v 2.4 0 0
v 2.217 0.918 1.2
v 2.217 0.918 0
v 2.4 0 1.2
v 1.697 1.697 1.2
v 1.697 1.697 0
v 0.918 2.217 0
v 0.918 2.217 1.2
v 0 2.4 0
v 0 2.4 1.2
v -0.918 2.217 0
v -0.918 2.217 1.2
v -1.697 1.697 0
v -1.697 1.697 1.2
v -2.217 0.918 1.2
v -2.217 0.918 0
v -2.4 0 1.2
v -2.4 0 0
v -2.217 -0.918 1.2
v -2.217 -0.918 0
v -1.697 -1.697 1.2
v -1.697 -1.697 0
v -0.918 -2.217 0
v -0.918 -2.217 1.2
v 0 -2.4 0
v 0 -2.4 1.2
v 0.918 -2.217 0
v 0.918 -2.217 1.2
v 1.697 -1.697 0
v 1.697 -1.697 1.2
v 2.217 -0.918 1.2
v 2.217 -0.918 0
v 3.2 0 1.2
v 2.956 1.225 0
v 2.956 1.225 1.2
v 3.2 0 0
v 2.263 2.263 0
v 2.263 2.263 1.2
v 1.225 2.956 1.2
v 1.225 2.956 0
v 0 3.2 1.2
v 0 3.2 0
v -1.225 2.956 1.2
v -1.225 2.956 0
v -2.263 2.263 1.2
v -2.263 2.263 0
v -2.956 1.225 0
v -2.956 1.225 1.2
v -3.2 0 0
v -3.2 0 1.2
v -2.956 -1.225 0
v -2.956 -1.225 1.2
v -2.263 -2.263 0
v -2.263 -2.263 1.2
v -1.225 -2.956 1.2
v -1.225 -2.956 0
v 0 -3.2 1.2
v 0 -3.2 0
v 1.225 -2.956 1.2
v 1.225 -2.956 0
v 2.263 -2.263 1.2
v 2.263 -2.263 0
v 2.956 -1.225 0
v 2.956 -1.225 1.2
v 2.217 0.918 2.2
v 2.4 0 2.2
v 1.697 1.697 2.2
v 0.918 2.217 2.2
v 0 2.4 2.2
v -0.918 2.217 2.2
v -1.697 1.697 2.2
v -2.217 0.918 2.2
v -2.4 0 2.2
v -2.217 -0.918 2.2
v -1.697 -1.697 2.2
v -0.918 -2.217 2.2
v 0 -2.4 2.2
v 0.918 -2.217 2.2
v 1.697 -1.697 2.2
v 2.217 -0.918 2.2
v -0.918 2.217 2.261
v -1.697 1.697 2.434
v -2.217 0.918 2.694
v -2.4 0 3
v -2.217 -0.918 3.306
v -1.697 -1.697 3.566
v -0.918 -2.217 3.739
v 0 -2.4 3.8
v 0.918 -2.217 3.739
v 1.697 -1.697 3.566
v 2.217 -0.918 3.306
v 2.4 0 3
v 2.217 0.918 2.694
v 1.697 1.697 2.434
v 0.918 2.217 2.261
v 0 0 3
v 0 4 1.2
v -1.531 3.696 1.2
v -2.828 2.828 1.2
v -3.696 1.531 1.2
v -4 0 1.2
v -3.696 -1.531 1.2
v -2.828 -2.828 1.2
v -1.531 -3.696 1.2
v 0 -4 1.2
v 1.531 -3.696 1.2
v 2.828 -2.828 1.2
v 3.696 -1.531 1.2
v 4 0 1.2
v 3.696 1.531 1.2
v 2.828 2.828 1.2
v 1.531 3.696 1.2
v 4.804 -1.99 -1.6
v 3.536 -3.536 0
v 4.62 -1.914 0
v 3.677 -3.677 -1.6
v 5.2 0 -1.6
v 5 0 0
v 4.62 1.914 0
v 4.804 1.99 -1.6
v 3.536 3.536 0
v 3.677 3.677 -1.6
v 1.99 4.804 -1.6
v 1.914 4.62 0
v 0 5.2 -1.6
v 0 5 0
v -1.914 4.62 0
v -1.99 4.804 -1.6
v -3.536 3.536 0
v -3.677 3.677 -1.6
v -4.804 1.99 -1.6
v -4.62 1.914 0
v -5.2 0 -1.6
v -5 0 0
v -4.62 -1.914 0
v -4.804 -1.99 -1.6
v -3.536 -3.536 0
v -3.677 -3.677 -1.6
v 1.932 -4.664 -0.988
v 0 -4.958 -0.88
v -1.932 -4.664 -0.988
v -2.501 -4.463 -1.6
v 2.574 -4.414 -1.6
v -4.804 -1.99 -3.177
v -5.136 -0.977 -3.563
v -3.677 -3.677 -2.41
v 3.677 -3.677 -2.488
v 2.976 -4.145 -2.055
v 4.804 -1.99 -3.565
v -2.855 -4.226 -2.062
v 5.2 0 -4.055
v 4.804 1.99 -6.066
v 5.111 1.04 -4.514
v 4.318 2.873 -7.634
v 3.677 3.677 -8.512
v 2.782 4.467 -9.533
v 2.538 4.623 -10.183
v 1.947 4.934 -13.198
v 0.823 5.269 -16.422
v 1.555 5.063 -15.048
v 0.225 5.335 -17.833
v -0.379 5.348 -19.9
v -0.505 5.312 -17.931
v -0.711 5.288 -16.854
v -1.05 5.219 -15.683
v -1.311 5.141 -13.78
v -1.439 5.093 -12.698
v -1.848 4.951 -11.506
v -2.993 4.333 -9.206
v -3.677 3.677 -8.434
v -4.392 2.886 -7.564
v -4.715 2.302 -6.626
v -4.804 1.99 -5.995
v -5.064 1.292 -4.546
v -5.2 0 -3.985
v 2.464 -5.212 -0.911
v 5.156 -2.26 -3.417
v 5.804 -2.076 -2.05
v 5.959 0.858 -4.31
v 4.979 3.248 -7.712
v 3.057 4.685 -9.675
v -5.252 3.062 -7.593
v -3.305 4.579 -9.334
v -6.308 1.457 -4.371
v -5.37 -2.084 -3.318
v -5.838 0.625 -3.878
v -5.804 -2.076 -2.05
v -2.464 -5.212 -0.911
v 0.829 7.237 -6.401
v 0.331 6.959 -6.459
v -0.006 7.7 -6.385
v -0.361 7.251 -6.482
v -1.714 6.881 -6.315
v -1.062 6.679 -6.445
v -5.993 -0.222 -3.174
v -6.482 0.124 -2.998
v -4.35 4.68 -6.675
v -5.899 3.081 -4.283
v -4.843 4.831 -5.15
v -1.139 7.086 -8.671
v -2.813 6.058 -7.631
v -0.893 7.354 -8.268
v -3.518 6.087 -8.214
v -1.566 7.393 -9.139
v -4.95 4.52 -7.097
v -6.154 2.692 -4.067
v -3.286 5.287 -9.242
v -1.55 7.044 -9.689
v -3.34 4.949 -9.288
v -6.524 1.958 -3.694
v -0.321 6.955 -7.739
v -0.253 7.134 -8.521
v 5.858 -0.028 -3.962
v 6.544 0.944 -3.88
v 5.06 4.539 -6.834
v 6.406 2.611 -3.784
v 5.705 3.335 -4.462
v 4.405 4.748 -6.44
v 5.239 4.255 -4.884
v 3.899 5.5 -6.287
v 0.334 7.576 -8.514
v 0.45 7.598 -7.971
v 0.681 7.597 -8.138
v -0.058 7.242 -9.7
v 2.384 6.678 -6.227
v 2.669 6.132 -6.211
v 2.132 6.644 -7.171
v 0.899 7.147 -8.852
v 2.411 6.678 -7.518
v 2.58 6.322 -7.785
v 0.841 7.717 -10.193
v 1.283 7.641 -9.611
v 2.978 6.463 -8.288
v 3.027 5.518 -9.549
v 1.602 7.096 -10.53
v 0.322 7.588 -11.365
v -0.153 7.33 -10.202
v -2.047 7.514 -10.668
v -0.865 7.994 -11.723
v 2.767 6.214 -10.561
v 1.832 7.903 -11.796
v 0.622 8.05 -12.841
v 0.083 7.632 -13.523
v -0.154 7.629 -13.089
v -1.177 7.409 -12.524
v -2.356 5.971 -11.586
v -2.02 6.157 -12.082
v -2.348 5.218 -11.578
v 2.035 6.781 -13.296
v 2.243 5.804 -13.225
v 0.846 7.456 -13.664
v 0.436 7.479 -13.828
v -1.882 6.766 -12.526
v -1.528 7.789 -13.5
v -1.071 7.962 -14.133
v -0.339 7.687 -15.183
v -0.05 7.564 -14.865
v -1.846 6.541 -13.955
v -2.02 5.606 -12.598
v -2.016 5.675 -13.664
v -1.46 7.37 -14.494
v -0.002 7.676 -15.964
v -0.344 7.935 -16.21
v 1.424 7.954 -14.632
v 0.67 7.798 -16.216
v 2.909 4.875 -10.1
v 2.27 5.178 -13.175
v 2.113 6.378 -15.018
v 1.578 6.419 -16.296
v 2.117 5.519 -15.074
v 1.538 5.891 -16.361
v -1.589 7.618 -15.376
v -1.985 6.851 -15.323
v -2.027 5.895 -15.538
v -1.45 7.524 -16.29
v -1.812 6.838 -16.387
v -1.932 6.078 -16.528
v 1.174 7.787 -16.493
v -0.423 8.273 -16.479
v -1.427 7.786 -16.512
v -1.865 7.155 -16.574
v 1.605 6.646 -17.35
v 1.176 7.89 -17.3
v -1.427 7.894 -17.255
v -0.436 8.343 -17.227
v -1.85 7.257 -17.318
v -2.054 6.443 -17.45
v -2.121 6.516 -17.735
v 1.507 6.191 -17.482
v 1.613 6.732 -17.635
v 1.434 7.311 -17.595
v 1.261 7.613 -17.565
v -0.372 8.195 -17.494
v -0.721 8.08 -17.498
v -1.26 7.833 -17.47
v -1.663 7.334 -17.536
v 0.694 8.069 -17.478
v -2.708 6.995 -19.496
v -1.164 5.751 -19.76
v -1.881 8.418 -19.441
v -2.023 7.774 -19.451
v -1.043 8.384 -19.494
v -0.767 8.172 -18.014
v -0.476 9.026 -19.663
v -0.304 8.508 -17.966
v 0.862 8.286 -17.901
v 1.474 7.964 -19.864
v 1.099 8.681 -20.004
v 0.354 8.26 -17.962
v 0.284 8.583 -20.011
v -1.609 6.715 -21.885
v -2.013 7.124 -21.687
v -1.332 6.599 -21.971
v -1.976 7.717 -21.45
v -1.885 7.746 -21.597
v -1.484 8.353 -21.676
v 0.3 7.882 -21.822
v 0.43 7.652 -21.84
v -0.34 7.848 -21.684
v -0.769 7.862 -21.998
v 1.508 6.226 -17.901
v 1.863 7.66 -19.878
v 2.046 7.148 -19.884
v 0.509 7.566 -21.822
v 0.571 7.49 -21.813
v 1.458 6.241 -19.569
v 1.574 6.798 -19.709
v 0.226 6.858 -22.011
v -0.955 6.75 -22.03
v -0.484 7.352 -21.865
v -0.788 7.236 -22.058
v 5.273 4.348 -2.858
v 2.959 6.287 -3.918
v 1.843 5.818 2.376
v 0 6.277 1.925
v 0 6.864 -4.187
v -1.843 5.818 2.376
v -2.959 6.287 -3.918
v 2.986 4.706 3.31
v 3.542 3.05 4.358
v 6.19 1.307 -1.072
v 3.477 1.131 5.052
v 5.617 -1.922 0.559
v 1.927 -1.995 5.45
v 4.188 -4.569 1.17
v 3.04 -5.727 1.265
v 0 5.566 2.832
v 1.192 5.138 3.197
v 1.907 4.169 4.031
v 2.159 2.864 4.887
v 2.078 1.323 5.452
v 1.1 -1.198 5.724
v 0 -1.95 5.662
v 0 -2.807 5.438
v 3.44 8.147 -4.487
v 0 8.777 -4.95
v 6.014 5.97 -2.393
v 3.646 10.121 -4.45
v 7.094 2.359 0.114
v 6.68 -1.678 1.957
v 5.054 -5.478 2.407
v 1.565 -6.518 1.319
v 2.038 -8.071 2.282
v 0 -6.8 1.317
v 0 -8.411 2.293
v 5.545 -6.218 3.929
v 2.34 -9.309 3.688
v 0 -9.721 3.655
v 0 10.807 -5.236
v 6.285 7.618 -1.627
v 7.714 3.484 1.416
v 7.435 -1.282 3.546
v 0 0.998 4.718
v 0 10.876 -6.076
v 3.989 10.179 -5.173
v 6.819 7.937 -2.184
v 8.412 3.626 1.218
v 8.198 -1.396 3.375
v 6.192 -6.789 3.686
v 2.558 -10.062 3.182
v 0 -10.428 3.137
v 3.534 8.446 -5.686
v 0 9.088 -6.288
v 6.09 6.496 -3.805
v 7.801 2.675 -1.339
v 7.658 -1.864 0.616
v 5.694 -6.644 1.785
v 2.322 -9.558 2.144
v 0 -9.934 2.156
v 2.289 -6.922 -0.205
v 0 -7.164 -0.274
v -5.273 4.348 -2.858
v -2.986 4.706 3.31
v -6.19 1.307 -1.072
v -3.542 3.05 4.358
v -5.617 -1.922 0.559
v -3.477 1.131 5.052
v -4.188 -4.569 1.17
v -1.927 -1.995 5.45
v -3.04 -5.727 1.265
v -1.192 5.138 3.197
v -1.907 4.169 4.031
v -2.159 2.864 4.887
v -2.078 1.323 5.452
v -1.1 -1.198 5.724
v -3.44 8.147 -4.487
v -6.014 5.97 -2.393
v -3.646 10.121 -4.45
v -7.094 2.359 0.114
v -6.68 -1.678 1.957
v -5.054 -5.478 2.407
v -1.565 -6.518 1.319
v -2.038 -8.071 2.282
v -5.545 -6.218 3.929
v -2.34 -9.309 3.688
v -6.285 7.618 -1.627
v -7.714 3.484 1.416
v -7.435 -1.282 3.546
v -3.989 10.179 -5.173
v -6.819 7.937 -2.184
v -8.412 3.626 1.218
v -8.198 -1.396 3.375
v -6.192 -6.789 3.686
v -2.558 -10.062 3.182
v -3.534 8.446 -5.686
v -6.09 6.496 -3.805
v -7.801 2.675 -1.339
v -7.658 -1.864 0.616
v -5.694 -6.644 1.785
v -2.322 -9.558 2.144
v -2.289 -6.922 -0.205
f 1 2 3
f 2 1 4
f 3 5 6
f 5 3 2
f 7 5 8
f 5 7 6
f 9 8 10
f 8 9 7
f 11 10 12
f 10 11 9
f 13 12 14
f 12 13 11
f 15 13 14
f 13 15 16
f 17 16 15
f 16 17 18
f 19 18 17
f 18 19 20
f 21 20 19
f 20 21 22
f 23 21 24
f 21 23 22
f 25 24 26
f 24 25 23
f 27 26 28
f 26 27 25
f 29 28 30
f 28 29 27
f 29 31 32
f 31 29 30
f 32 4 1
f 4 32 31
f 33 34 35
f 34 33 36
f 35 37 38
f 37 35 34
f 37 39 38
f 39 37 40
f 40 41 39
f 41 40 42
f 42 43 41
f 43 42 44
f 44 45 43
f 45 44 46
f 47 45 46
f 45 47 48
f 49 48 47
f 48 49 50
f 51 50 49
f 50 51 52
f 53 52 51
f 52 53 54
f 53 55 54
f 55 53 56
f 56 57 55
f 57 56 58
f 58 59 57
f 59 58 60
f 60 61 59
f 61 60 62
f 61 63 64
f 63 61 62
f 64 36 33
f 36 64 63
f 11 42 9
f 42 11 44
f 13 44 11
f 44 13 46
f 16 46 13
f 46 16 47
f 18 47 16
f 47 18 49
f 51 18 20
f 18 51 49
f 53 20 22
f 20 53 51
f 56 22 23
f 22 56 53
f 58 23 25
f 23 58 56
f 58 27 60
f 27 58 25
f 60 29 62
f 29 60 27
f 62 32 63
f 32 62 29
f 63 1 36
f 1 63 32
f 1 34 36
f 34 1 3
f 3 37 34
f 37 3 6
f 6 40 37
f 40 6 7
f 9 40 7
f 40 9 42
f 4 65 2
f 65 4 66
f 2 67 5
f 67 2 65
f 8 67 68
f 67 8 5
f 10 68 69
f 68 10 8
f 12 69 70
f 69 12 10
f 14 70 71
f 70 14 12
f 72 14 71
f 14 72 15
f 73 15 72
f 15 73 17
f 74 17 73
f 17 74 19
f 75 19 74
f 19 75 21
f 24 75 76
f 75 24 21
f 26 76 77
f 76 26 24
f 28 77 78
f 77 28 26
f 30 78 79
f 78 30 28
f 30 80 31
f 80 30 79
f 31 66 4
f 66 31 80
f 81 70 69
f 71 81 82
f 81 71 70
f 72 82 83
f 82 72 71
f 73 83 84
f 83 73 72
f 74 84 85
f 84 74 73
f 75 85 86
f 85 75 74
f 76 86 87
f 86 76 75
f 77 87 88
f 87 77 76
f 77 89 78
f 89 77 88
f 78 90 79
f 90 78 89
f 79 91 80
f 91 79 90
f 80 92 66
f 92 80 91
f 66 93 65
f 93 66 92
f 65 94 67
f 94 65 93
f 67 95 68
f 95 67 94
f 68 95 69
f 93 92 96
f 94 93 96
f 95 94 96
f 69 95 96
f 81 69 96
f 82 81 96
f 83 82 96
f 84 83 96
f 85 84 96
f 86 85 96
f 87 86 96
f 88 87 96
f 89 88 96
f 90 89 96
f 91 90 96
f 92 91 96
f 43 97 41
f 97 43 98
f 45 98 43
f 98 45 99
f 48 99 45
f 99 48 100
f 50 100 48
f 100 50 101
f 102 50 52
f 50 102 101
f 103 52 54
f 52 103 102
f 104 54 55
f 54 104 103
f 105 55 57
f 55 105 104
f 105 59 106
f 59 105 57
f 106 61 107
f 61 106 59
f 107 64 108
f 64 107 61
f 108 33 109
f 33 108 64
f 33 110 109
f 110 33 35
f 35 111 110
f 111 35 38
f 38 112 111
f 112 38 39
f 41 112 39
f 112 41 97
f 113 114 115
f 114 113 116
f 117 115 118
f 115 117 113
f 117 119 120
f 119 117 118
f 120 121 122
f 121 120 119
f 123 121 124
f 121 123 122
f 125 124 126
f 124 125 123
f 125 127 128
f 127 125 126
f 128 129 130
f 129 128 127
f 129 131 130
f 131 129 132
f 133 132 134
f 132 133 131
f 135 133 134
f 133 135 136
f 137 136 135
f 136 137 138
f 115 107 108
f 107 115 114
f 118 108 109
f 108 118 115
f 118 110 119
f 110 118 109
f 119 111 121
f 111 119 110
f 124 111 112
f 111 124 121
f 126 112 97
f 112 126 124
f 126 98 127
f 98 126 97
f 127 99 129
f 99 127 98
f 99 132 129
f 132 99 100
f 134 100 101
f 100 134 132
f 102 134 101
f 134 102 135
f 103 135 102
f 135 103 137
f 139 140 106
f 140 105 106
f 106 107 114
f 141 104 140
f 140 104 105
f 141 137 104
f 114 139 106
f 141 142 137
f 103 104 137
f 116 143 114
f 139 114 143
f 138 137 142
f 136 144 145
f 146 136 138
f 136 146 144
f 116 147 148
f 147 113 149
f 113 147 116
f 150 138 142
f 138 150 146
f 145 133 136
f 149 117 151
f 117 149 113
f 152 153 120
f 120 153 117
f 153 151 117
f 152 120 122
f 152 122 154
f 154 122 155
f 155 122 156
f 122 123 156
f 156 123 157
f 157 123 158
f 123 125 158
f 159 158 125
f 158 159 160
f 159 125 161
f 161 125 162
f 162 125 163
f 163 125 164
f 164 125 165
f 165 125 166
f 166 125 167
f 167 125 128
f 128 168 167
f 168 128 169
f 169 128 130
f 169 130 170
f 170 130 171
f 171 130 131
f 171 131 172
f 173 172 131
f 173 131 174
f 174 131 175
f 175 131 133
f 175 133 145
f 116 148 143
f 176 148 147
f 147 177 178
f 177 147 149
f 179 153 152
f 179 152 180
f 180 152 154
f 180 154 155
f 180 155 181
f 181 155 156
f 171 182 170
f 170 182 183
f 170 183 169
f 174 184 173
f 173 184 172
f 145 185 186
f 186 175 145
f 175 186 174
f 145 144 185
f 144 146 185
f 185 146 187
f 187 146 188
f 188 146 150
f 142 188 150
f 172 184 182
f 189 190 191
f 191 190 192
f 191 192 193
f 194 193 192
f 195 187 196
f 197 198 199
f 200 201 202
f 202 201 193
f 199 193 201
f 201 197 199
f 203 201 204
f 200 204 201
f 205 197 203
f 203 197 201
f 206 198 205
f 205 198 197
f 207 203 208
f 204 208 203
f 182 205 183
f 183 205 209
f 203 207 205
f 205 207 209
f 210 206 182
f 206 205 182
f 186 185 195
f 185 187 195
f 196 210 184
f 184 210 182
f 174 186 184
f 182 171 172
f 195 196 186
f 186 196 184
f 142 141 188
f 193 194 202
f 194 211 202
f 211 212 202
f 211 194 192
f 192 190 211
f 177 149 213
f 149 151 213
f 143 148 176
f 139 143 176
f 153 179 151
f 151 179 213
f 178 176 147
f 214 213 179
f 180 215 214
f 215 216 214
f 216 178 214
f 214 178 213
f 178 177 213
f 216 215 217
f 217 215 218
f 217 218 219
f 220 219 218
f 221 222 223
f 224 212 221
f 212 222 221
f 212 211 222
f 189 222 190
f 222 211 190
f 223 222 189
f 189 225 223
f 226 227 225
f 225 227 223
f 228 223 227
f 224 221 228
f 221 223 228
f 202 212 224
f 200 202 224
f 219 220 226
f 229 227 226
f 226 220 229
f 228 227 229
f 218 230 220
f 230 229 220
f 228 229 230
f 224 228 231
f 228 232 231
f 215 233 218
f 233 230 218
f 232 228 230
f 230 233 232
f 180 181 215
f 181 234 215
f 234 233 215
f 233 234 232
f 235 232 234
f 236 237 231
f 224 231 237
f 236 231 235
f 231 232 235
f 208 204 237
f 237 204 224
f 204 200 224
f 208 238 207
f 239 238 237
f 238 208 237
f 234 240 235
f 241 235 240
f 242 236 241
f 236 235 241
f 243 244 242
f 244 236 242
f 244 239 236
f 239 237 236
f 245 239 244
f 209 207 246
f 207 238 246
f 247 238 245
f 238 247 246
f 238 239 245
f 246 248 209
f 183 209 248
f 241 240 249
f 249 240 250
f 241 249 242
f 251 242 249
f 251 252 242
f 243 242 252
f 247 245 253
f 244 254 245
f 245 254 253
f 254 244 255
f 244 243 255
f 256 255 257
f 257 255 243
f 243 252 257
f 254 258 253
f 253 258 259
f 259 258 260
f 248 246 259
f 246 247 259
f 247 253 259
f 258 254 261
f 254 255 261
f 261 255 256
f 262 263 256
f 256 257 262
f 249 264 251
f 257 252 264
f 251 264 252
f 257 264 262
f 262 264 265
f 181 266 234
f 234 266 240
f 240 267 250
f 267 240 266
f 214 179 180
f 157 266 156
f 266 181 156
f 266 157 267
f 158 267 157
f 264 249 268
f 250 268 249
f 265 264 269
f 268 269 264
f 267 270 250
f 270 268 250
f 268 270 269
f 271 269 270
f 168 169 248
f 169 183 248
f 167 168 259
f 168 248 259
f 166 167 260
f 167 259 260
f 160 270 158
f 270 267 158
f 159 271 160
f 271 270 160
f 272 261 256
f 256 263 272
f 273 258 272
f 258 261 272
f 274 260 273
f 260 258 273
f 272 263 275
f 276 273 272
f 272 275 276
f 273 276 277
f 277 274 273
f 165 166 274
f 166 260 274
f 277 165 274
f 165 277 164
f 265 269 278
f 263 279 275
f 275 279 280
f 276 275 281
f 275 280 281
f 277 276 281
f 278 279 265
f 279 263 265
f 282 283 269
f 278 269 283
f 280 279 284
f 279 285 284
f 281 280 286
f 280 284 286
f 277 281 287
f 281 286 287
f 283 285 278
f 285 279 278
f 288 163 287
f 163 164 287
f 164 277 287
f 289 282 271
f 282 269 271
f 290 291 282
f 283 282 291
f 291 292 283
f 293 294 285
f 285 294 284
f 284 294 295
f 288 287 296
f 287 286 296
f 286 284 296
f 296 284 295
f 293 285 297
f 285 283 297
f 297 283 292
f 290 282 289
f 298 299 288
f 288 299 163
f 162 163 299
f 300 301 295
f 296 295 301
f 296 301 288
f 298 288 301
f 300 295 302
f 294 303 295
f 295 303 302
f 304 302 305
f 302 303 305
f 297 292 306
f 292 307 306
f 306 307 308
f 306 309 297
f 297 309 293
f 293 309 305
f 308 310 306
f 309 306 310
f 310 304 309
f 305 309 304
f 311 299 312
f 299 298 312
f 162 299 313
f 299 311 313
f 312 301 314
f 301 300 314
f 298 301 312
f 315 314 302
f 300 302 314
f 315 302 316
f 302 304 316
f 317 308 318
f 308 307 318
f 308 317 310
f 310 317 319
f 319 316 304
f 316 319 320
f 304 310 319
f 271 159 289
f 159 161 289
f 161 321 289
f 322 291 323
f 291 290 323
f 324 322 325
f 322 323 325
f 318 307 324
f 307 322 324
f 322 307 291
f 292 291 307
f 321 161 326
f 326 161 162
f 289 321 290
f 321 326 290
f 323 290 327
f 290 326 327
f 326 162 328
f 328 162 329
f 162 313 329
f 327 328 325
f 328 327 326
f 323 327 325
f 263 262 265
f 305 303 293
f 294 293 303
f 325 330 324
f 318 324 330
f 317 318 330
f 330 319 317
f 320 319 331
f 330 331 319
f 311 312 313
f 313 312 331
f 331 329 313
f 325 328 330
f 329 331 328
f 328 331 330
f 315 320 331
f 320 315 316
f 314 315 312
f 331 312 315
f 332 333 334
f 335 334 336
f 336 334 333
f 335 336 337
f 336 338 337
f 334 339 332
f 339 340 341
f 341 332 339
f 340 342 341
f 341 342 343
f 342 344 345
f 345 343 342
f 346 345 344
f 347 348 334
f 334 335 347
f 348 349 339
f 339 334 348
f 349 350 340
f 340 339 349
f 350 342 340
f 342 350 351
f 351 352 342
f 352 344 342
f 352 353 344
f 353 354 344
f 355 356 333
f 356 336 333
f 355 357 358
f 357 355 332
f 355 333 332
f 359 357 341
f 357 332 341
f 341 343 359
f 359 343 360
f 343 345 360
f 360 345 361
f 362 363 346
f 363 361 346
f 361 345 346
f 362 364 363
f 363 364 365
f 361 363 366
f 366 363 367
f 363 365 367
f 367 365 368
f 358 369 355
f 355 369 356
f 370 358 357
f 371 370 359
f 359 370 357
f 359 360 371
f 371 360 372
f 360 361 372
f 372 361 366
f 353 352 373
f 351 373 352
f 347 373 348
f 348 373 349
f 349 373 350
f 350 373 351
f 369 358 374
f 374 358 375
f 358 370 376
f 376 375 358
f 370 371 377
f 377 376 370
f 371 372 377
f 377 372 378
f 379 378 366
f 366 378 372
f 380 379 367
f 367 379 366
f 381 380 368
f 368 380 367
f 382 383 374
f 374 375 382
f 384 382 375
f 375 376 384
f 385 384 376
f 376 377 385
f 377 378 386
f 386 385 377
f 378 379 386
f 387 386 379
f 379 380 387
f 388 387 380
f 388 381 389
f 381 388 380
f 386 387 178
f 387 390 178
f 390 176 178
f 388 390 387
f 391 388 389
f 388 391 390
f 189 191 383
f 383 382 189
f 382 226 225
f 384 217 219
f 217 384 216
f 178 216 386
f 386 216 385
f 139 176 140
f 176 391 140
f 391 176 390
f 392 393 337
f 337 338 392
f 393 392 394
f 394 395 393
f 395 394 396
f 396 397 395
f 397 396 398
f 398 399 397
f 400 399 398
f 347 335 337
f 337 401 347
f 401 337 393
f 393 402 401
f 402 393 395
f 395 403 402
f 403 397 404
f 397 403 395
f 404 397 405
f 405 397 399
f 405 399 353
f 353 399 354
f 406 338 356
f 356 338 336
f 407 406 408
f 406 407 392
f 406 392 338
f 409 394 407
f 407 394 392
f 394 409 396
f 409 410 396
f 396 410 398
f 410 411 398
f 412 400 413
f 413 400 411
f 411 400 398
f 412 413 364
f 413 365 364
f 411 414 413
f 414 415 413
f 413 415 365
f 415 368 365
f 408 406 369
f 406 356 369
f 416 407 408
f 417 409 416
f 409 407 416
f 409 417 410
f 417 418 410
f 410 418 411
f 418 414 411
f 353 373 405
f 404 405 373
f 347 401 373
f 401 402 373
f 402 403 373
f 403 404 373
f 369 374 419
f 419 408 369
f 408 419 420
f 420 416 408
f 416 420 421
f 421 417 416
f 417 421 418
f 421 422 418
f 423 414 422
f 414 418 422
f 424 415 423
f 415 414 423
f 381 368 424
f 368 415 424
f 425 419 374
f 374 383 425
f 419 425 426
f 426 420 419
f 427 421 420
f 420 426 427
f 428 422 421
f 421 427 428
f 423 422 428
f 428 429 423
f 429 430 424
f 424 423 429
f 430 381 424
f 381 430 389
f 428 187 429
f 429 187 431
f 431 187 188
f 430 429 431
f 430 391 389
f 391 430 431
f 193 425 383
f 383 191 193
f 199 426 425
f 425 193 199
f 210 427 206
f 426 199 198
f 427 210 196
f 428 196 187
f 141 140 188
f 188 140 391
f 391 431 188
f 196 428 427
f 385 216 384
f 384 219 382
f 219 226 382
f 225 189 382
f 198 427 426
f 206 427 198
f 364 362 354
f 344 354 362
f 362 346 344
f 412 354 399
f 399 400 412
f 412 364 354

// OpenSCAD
use <../lib.scad>
use <s/10168s01.scad>
use <s/10168s02.scad>
function ldraw_lib__10168() = [
// 0 Minifig Hat Cowboy with Hair in Braid
// 0 Name: 10168.dat
// 0 Author: Lisa Winter [LisaWinter]
// 0 !LDRAW_ORG Part UPDATE 2024-08
// 0 !LICENSE Licensed under CC BY 4.0 : see CAreadme.txt
// 
// 0 BFC CERTIFY CCW
  [0,"BFC","CERTIFY"],
  [0,"BFC","CCW"],
// 
// 0 !CATEGORY Minifig Headwear
// 
// 0 !HISTORY 2013-08-14 {LEGO Digital Designer} Original part shape
// 0 !HISTORY 2024-09-09 [LisaWinter] File preparation for LDraw Parts Tracker
// 0 !HISTORY 2024-09-30 [OrionP] Official Update 2024-08
// 
// 0 // Hair
// 1 16 0 0 0 1 0 0 0 1 0 0 0 1 s\10168s01.dat
  [1,16,0,0,0,1,0,0,0,1,0,0,0,1, ldraw_lib__s__10168s01()],
// 0 // Hat
// 1 16 0 0 0 1 0 0 0 1 0 0 0 1 s\10168s02.dat
  [1,16,0,0,0,1,0,0,0,1,0,0,0,1, ldraw_lib__s__10168s02()],
// 
// 0 // Patternable Area
// 3 16 0 -3.292 -17.001 3.913 -3.298 -16.296 0 -13.595 -7.017
  [3,16,0,-3.292,-17.001,3.913,-3.298,-16.296,0,-13.595,-7.017],
// 3 16 4.817 -13.626 -4.988 0 -13.595 -7.017 3.913 -3.298 -16.296
  [3,16,4.817,-13.626,-4.988,0,-13.595,-7.017,3.913,-3.298,-16.296],
// 3 16 3.913 -3.298 -16.296 7.599 -3.162 -14.318 4.817 -13.626 -4.988
  [3,16,3.913,-3.298,-16.296,7.599,-3.162,-14.318,4.817,-13.626,-4.988],
// 3 16 -3.913 -3.298 -16.296 0 -13.595 -7.017 -4.817 -13.626 -4.988
  [3,16,-3.913,-3.298,-16.296,0,-13.595,-7.017,-4.817,-13.626,-4.988],
// 3 16 -4.817 -13.626 -4.988 -7.599 -3.162 -14.318 -3.913 -3.298 -16.296
  [3,16,-4.817,-13.626,-4.988,-7.599,-3.162,-14.318,-3.913,-3.298,-16.296],
// 3 16 -3.913 -3.298 -16.296 0 -3.292 -17.001 0 -13.595 -7.017
  [3,16,-3.913,-3.298,-16.296,0,-3.292,-17.001,0,-13.595,-7.017],
// 
// 5 24 4.817 -13.626 -4.988 3.913 -3.298 -16.296 0 -13.595 -7.017 7.599 -3.162 -14.318
  [5,24,4.817,-13.626,-4.988,3.913,-3.298,-16.296,0,-13.595,-7.017,7.599,-3.162,-14.318],
// 5 24 -3.913 -3.298 -16.296 0 -13.595 -7.017 0 -3.292 -17.001 -4.817 -13.626 -4.988
  [5,24,-3.913,-3.298,-16.296,0,-13.595,-7.017,0,-3.292,-17.001,-4.817,-13.626,-4.988],
// 5 24 0 -13.595 -7.017 0 -3.292 -17.001 -3.913 -3.298 -16.296 3.913 -3.298 -16.296
  [5,24,0,-13.595,-7.017,0,-3.292,-17.001,-3.913,-3.298,-16.296,3.913,-3.298,-16.296],
// 5 24 3.913 -3.298 -16.296 0 -13.595 -7.017 0 -3.292 -17.001 4.817 -13.626 -4.988
  [5,24,3.913,-3.298,-16.296,0,-13.595,-7.017,0,-3.292,-17.001,4.817,-13.626,-4.988],
// 5 24 -4.817 -13.626 -4.988 -3.913 -3.298 -16.296 -7.599 -3.162 -14.318 0 -13.595 -7.017
  [5,24,-4.817,-13.626,-4.988,-3.913,-3.298,-16.296,-7.599,-3.162,-14.318,0,-13.595,-7.017],
];
module ldraw_lib__10168(step=0, col=false, unit=2/5, alt=false, line=0.2, solid=!$preview)
    makepoly(ldraw_lib__10168(), step=step, col=col, unit=unit, alt=alt, line=line, solid=solid);
ldraw_lib__10168(line=0.2);
